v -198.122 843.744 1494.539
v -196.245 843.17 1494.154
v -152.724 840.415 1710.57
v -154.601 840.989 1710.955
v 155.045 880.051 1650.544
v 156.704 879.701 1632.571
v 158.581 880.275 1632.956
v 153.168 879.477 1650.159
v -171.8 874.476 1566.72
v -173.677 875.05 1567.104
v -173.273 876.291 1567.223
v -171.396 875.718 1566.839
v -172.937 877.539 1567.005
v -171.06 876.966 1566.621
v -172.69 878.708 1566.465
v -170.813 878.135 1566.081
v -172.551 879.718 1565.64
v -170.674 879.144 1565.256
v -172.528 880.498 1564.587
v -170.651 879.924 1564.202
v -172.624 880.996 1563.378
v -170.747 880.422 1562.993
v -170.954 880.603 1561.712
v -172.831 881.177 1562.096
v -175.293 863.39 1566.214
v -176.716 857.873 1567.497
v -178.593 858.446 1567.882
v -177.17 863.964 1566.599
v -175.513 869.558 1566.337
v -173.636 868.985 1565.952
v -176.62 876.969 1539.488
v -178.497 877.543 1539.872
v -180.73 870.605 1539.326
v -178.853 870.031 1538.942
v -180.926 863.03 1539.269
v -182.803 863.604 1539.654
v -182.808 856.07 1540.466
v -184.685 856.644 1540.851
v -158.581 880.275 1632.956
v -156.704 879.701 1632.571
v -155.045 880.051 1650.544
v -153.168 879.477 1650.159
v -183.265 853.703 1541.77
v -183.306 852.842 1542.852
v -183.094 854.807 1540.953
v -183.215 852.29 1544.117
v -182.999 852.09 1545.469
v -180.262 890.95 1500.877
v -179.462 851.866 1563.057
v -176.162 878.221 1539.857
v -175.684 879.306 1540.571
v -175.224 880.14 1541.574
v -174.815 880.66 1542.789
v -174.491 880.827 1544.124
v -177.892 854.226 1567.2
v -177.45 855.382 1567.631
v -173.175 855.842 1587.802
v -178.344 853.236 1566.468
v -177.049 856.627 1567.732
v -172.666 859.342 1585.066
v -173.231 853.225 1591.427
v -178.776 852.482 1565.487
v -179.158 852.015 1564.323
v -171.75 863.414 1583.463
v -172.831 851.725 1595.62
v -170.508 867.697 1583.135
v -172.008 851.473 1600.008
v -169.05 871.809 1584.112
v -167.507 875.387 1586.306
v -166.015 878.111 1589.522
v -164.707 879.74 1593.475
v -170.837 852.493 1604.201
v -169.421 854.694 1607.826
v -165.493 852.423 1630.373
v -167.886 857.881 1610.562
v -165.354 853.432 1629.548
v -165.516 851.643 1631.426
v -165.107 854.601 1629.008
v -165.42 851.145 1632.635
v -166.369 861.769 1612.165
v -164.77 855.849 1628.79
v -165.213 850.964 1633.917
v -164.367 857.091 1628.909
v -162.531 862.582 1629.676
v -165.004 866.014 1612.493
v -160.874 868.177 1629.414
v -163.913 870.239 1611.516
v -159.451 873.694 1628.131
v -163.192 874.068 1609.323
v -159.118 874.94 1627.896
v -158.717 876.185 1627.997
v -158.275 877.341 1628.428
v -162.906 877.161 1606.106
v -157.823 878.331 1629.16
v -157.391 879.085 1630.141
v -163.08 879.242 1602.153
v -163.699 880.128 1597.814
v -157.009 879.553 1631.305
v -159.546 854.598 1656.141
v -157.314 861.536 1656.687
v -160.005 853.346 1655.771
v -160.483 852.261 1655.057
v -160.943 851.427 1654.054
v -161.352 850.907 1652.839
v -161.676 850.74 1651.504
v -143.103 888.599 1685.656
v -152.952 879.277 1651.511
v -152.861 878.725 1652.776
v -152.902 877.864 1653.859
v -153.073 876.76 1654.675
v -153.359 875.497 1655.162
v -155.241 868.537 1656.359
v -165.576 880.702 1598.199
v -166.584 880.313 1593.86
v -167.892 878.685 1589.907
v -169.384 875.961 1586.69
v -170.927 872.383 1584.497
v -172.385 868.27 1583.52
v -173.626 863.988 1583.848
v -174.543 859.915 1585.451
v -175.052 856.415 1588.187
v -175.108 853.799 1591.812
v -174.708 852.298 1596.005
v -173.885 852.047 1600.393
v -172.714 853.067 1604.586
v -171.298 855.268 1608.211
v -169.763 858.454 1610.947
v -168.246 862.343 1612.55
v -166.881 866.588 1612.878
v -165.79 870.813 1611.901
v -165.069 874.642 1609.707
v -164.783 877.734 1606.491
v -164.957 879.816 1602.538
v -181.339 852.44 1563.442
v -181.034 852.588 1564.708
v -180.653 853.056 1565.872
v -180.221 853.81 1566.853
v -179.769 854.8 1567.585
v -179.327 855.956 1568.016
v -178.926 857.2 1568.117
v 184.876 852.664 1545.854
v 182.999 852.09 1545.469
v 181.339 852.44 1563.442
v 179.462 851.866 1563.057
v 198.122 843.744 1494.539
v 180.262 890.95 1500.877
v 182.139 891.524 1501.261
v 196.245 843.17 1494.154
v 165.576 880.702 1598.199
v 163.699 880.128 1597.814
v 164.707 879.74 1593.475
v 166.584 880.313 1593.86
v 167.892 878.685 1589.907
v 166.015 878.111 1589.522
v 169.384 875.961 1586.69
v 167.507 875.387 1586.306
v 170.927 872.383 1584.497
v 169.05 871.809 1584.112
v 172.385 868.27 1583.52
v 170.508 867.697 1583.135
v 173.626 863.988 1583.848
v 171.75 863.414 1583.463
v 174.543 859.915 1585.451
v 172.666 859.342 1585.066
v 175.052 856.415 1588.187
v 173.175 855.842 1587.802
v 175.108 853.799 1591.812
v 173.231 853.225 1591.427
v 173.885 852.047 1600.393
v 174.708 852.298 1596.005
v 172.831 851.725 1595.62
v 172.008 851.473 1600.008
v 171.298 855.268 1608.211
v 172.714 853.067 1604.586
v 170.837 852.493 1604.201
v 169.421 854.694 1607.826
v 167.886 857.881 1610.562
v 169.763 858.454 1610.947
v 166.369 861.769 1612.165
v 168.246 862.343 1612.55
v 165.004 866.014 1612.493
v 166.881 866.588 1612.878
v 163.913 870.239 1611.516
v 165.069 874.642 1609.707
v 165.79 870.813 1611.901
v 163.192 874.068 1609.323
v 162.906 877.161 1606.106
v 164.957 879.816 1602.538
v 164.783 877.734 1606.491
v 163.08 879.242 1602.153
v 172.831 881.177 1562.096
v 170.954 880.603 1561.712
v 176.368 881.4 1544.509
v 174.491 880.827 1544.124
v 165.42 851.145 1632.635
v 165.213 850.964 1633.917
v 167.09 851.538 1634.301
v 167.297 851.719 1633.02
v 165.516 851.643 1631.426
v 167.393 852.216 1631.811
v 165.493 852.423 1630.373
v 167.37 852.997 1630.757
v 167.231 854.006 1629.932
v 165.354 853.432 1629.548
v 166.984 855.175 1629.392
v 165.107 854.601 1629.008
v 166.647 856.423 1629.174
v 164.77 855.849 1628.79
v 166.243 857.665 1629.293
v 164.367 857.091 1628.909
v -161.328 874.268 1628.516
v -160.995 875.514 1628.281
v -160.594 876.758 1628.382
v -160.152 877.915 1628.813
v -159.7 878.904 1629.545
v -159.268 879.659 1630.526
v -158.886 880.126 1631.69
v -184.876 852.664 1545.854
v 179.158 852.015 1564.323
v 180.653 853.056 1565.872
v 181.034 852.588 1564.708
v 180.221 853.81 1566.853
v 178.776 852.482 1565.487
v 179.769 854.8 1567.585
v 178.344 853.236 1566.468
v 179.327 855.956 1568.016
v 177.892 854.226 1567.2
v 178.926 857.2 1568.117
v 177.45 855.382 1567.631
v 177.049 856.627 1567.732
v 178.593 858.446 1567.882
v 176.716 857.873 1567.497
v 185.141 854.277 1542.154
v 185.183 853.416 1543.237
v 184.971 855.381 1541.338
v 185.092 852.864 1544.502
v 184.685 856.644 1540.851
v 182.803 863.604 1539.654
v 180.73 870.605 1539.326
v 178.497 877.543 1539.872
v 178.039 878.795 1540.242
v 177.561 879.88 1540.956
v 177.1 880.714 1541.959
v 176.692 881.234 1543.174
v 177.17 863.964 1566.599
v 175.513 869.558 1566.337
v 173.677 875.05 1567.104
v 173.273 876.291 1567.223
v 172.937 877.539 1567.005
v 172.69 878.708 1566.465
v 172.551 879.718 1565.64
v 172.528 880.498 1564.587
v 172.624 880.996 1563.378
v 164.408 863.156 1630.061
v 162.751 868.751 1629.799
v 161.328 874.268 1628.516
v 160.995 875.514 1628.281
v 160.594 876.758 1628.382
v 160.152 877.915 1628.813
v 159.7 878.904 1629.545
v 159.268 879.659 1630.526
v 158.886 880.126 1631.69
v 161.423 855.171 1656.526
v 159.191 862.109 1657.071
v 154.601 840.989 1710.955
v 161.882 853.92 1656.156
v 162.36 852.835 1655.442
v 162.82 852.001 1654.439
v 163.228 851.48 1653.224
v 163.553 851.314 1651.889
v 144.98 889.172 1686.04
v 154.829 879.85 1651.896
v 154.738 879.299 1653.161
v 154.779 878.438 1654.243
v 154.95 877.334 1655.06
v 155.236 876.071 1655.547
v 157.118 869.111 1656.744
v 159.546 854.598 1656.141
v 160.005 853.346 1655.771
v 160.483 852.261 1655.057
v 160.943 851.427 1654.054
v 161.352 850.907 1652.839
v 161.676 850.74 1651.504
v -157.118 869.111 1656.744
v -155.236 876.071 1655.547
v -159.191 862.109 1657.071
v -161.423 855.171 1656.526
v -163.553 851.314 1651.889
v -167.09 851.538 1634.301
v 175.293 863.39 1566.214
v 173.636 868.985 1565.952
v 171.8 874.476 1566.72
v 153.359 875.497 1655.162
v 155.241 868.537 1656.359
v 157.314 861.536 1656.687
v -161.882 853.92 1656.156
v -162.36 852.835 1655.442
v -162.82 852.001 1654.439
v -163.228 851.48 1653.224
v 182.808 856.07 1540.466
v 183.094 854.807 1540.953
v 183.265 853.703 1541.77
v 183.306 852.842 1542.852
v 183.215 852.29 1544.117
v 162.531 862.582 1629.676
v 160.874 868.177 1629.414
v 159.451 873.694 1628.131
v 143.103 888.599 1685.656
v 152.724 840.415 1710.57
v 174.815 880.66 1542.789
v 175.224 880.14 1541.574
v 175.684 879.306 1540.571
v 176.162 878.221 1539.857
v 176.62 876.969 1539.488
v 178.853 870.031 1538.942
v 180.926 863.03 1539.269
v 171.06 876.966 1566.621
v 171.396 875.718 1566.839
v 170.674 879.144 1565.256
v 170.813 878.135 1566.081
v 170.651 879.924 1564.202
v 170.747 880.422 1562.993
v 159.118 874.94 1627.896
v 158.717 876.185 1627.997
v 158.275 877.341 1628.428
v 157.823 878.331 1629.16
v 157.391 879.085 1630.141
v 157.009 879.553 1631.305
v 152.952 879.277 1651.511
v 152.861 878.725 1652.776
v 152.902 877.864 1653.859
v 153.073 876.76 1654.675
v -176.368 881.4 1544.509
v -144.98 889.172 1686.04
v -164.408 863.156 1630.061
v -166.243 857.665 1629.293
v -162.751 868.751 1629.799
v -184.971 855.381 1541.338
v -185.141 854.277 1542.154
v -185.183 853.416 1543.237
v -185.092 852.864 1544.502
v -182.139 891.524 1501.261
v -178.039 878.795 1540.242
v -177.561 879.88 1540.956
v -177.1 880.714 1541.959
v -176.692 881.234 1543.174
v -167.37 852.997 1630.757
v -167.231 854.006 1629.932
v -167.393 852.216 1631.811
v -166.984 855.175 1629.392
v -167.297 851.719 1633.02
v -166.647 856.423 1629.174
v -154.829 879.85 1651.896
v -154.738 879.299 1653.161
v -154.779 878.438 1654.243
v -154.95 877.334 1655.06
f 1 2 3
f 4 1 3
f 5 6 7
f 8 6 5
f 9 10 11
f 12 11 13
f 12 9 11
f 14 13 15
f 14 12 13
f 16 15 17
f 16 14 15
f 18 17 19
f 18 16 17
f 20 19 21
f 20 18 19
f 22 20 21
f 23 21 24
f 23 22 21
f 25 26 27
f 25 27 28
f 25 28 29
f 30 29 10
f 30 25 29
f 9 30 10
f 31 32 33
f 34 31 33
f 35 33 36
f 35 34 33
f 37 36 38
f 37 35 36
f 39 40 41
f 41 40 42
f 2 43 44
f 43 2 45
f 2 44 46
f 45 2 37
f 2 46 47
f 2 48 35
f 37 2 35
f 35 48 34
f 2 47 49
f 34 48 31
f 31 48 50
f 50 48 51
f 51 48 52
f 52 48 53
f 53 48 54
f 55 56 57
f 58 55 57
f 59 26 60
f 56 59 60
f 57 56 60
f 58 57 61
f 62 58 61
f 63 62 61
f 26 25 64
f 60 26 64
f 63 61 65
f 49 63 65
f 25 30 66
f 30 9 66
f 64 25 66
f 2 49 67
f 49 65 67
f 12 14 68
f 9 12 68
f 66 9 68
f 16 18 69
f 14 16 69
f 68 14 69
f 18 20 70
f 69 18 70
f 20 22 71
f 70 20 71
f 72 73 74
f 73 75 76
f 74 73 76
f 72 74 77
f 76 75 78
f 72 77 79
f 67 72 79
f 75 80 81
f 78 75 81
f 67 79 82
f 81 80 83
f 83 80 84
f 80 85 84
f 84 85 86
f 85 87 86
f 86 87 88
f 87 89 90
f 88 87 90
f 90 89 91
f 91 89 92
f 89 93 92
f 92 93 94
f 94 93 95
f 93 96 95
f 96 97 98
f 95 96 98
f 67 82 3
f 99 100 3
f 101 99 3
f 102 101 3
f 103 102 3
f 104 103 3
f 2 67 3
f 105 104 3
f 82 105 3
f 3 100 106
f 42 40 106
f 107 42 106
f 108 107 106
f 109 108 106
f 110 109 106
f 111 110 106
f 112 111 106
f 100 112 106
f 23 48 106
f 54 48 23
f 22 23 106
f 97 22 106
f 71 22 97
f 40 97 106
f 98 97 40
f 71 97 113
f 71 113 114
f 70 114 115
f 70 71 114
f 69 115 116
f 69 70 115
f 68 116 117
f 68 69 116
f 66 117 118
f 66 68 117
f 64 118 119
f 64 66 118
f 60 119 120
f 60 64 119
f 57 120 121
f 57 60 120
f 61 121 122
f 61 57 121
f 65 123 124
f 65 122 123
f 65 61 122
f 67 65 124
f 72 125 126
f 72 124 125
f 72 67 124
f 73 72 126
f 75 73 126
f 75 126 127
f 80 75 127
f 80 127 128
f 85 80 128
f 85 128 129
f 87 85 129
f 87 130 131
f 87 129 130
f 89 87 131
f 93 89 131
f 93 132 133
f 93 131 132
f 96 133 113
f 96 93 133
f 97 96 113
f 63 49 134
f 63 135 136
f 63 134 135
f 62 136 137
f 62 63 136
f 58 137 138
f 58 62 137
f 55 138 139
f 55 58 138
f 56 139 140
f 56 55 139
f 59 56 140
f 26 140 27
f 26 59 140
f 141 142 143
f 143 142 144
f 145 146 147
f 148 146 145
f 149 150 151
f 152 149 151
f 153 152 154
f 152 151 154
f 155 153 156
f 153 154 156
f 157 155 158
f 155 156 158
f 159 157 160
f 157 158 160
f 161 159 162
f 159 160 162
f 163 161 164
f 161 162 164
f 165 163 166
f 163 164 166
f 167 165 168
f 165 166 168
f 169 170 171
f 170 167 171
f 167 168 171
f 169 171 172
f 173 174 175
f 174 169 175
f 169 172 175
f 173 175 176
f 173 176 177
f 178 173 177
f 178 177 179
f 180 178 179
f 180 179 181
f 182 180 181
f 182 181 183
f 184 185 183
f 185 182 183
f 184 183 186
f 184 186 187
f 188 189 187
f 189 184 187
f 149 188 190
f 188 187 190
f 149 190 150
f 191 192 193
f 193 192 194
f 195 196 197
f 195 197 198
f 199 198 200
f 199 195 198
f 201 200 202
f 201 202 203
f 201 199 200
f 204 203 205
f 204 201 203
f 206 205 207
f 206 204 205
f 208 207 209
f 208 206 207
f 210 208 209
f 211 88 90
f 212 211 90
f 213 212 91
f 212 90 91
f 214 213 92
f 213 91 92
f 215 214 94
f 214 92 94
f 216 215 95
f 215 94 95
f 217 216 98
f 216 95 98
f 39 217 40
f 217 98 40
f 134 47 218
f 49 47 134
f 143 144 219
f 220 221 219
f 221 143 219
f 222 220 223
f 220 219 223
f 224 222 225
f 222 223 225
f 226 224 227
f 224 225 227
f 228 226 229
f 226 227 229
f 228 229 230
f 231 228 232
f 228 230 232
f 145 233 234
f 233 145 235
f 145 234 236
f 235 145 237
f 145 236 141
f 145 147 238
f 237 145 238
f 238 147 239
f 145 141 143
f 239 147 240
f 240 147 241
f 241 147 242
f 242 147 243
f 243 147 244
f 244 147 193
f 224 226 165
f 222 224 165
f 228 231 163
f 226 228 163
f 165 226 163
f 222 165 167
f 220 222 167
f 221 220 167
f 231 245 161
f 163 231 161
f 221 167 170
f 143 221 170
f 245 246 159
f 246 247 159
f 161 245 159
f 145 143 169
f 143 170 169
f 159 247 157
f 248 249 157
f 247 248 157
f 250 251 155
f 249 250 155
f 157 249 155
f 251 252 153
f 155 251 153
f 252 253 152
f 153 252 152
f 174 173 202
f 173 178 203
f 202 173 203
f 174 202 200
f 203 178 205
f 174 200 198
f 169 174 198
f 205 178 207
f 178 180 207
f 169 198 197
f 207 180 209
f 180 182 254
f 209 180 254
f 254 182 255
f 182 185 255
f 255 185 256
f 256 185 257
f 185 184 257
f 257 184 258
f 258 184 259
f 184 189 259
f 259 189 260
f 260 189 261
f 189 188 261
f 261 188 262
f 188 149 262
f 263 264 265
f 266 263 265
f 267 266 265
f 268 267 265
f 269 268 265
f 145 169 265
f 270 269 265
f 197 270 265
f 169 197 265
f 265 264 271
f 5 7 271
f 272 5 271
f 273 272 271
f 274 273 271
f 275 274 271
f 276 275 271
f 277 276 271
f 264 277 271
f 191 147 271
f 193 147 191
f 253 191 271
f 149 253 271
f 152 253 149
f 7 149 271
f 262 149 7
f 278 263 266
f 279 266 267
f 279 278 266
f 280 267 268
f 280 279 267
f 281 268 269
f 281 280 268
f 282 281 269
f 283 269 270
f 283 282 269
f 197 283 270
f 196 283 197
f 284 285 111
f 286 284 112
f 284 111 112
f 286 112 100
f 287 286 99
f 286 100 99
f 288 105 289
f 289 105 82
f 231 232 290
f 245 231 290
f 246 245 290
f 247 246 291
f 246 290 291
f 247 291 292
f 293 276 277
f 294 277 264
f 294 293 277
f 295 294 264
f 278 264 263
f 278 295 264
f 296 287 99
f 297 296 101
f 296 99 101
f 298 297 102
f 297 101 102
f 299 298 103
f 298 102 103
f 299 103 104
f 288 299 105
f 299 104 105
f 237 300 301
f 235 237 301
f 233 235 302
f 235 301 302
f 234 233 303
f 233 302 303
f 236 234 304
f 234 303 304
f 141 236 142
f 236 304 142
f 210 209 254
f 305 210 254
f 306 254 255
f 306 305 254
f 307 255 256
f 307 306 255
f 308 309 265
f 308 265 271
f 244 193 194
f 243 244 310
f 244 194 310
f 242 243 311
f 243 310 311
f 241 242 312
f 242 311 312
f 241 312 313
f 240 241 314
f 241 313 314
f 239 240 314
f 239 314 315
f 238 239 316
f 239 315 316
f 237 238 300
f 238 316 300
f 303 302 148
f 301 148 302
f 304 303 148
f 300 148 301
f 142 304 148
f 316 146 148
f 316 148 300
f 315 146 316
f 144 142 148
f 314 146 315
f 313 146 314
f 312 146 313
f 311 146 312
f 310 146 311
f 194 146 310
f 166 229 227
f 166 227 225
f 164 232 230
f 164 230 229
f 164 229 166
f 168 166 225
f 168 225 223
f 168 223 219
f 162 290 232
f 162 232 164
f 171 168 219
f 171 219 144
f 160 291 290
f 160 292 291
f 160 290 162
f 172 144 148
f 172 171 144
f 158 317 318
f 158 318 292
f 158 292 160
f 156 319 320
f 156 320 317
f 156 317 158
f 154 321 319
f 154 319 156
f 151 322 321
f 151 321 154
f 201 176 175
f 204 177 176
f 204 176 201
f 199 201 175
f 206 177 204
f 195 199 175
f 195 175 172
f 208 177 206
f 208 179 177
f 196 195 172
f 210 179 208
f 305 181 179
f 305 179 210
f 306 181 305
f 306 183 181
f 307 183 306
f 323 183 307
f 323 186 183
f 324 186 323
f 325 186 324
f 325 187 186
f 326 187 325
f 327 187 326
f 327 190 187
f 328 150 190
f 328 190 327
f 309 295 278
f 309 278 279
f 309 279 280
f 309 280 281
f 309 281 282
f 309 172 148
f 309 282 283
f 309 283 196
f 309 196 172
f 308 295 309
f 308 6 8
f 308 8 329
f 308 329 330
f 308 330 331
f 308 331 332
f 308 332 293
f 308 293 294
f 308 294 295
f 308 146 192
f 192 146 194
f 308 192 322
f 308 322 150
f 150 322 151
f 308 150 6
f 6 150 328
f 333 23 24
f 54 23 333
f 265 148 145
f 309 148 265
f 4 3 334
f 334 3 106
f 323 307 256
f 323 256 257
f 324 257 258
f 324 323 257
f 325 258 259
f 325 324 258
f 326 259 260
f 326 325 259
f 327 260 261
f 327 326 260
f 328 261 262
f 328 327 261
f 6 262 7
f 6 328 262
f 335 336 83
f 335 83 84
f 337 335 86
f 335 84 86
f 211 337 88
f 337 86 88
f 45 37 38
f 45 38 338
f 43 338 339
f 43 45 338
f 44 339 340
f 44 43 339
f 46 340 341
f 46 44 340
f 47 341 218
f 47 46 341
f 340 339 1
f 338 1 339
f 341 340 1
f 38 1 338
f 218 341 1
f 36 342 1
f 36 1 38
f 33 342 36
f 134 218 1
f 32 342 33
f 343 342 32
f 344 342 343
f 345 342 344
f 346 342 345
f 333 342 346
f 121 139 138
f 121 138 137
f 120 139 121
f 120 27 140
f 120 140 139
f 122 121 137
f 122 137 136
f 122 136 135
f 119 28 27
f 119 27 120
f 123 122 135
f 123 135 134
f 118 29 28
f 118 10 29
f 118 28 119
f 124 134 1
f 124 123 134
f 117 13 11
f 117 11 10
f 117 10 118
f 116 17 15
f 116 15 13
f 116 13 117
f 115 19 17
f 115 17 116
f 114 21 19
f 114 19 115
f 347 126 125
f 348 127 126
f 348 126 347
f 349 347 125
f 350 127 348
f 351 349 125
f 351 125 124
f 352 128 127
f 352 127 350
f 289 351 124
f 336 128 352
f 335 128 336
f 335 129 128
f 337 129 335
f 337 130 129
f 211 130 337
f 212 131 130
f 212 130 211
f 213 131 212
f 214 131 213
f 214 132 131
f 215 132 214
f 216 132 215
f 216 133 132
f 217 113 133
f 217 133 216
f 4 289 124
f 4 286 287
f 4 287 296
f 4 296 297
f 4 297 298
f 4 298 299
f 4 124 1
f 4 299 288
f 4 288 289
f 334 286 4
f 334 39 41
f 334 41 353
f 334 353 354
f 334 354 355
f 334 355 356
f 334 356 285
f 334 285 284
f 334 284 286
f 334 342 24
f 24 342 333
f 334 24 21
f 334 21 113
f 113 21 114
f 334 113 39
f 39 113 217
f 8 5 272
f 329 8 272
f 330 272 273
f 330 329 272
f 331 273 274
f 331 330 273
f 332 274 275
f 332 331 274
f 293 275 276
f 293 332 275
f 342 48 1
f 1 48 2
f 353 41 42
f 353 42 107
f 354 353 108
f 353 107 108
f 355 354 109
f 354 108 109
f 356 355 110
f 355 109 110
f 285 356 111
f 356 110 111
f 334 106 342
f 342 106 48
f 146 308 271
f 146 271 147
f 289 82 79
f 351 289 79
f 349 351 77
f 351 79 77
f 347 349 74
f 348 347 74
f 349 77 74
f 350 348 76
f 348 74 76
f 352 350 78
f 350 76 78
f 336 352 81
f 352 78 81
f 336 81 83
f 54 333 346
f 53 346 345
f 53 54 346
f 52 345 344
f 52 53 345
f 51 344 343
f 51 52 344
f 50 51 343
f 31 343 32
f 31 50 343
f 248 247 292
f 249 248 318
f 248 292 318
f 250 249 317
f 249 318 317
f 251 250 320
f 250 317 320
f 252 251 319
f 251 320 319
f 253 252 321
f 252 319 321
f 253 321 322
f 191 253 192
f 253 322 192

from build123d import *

# Parameters (mm, degrees)
BOSS_EXTRUDE1_START     = 12.7
BOSS_EXTRUDE1_DEPTH     = 2
CUT_EXTRUDE4_DEPTH      = 1797.04556265
CUT_EXTRUDE4_DEPTH_BACK = 1797.04556265
SKETCH3_R               = 15
CUT_EXTRUDE5_DEPTH      = 1796.95506988
CUT_EXTRUDE5_DEPTH_BACK = 1796.95506988


with BuildPart() as part:
    # Sketch1 → Boss-Extrude1 (new body)
    with BuildSketch(Plane(origin=(-657.646924254, 201.024900686, 134.809319163), x_dir=(0.18505627699526195, -0.05267382726489745, 0.9813152614047744), z_dir=(-0.9384580915226618, 0.28686128937701555, 0.19237206427285553)).offset(BOSS_EXTRUDE1_START)):
        Polygon((1392.544897132, 794.160740411), (1385.506771818, 743.820944023), (1606.078262607, 753.087712192), (1580.871537579, 802.072820575), align=None)
    extrude(amount=BOSS_EXTRUDE1_DEPTH)

    # Sketch3 → Cut-Extrude4 (cut, two sides: drawn at the far end of the back side and taken through both)
    with BuildSketch(Plane(origin=(-657.646924254, 201.024900686, 134.809319163), x_dir=(0.18505627699526195, -0.05267382726489745, 0.9813152614047744), z_dir=(-0.9384580915226618, 0.28686128937701555, 0.19237206427285553)).offset(-CUT_EXTRUDE4_DEPTH_BACK)):
        with Locations(Location((1491.250367284, 773.2855543, 0), (0, 0, 89.786696616))):
            Circle(SKETCH3_R)
    extrude(amount=CUT_EXTRUDE4_DEPTH + CUT_EXTRUDE4_DEPTH_BACK, mode=Mode.SUBTRACT)

    # Sketch4 → Cut-Extrude5 (cut, two sides: drawn at the far end of the back side and taken through both)
    with BuildSketch(Plane(origin=(-671.4422582, 205.24176164, 137.637188508), x_dir=(0.18625871511916806, -0.04872436407690483, 0.9812918156121848), z_dir=(-0.9384580915226616, 0.28686128937701677, 0.1923720642728549)).offset(-CUT_EXTRUDE5_DEPTH_BACK)):
        with BuildLine():
            Line((1457.746239108, 780.743585607), (1439.817906985, 780.064506584))
            ThreePointArc((1439.817906985, 780.064506584), (1436.665960559, 778.787820254), (1435.059611388, 775.790431957))
            ThreePointArc((1435.059611388, 775.790431957), (1434.473170135, 764.851305337), (1435.885435701, 753.987884581))
            ThreePointArc((1435.885435701, 753.987884581), (1437.713923604, 751.120599062), (1440.953415416, 750.086003943))
            Line((1440.953415416, 750.086003943), (1458.881747539, 750.765082966))
            ThreePointArc((1458.881747539, 750.765082966), (1462.783354332, 752.88662978), (1463.457520038, 757.276276356))
            ThreePointArc((1463.457520038, 757.276276356), (1461.953464223, 765.892188066), (1462.8014485, 774.597188993))
            ThreePointArc((1462.8014485, 774.597188993), (1461.797153878, 778.923259817), (1457.746239108, 780.743585607))
        make_face()
        with BuildLine():
            Line((1529.978603296, 783.479561433), (1547.906935419, 784.158640456))
            ThreePointArc((1547.906935419, 784.158640456), (1551.146427231, 783.124045336), (1552.974915134, 780.256759817))
            ThreePointArc((1552.974915134, 780.256759817), (1554.3871807, 769.393339061), (1553.800739448, 758.454212442))
            ThreePointArc((1553.800739448, 758.454212442), (1552.194390277, 755.456824145), (1549.04244385, 754.180137815))
            Line((1549.04244385, 754.180137815), (1531.114111727, 753.501058792))
            ThreePointArc((1531.114111727, 753.501058792), (1527.063196957, 755.321384582), (1526.058902335, 759.647455405))
            ThreePointArc((1526.058902335, 759.647455405), (1526.906886612, 768.352456333), (1525.402830797, 776.968368042))
            ThreePointArc((1525.402830797, 776.968368042), (1526.076996503, 781.358014618), (1529.978603296, 783.479561433))
        make_face()
    extrude(amount=CUT_EXTRUDE5_DEPTH + CUT_EXTRUDE5_DEPTH_BACK, mode=Mode.SUBTRACT)


with BuildPart() as body_2:
    # Mirror2: mirrored copy
    add(part.part.mirror(Plane(origin=(0, 0, 0), x_dir=(0, 0, 1), z_dir=(1, 0, 0))))


solid = Compound([part.part, body_2.part])
